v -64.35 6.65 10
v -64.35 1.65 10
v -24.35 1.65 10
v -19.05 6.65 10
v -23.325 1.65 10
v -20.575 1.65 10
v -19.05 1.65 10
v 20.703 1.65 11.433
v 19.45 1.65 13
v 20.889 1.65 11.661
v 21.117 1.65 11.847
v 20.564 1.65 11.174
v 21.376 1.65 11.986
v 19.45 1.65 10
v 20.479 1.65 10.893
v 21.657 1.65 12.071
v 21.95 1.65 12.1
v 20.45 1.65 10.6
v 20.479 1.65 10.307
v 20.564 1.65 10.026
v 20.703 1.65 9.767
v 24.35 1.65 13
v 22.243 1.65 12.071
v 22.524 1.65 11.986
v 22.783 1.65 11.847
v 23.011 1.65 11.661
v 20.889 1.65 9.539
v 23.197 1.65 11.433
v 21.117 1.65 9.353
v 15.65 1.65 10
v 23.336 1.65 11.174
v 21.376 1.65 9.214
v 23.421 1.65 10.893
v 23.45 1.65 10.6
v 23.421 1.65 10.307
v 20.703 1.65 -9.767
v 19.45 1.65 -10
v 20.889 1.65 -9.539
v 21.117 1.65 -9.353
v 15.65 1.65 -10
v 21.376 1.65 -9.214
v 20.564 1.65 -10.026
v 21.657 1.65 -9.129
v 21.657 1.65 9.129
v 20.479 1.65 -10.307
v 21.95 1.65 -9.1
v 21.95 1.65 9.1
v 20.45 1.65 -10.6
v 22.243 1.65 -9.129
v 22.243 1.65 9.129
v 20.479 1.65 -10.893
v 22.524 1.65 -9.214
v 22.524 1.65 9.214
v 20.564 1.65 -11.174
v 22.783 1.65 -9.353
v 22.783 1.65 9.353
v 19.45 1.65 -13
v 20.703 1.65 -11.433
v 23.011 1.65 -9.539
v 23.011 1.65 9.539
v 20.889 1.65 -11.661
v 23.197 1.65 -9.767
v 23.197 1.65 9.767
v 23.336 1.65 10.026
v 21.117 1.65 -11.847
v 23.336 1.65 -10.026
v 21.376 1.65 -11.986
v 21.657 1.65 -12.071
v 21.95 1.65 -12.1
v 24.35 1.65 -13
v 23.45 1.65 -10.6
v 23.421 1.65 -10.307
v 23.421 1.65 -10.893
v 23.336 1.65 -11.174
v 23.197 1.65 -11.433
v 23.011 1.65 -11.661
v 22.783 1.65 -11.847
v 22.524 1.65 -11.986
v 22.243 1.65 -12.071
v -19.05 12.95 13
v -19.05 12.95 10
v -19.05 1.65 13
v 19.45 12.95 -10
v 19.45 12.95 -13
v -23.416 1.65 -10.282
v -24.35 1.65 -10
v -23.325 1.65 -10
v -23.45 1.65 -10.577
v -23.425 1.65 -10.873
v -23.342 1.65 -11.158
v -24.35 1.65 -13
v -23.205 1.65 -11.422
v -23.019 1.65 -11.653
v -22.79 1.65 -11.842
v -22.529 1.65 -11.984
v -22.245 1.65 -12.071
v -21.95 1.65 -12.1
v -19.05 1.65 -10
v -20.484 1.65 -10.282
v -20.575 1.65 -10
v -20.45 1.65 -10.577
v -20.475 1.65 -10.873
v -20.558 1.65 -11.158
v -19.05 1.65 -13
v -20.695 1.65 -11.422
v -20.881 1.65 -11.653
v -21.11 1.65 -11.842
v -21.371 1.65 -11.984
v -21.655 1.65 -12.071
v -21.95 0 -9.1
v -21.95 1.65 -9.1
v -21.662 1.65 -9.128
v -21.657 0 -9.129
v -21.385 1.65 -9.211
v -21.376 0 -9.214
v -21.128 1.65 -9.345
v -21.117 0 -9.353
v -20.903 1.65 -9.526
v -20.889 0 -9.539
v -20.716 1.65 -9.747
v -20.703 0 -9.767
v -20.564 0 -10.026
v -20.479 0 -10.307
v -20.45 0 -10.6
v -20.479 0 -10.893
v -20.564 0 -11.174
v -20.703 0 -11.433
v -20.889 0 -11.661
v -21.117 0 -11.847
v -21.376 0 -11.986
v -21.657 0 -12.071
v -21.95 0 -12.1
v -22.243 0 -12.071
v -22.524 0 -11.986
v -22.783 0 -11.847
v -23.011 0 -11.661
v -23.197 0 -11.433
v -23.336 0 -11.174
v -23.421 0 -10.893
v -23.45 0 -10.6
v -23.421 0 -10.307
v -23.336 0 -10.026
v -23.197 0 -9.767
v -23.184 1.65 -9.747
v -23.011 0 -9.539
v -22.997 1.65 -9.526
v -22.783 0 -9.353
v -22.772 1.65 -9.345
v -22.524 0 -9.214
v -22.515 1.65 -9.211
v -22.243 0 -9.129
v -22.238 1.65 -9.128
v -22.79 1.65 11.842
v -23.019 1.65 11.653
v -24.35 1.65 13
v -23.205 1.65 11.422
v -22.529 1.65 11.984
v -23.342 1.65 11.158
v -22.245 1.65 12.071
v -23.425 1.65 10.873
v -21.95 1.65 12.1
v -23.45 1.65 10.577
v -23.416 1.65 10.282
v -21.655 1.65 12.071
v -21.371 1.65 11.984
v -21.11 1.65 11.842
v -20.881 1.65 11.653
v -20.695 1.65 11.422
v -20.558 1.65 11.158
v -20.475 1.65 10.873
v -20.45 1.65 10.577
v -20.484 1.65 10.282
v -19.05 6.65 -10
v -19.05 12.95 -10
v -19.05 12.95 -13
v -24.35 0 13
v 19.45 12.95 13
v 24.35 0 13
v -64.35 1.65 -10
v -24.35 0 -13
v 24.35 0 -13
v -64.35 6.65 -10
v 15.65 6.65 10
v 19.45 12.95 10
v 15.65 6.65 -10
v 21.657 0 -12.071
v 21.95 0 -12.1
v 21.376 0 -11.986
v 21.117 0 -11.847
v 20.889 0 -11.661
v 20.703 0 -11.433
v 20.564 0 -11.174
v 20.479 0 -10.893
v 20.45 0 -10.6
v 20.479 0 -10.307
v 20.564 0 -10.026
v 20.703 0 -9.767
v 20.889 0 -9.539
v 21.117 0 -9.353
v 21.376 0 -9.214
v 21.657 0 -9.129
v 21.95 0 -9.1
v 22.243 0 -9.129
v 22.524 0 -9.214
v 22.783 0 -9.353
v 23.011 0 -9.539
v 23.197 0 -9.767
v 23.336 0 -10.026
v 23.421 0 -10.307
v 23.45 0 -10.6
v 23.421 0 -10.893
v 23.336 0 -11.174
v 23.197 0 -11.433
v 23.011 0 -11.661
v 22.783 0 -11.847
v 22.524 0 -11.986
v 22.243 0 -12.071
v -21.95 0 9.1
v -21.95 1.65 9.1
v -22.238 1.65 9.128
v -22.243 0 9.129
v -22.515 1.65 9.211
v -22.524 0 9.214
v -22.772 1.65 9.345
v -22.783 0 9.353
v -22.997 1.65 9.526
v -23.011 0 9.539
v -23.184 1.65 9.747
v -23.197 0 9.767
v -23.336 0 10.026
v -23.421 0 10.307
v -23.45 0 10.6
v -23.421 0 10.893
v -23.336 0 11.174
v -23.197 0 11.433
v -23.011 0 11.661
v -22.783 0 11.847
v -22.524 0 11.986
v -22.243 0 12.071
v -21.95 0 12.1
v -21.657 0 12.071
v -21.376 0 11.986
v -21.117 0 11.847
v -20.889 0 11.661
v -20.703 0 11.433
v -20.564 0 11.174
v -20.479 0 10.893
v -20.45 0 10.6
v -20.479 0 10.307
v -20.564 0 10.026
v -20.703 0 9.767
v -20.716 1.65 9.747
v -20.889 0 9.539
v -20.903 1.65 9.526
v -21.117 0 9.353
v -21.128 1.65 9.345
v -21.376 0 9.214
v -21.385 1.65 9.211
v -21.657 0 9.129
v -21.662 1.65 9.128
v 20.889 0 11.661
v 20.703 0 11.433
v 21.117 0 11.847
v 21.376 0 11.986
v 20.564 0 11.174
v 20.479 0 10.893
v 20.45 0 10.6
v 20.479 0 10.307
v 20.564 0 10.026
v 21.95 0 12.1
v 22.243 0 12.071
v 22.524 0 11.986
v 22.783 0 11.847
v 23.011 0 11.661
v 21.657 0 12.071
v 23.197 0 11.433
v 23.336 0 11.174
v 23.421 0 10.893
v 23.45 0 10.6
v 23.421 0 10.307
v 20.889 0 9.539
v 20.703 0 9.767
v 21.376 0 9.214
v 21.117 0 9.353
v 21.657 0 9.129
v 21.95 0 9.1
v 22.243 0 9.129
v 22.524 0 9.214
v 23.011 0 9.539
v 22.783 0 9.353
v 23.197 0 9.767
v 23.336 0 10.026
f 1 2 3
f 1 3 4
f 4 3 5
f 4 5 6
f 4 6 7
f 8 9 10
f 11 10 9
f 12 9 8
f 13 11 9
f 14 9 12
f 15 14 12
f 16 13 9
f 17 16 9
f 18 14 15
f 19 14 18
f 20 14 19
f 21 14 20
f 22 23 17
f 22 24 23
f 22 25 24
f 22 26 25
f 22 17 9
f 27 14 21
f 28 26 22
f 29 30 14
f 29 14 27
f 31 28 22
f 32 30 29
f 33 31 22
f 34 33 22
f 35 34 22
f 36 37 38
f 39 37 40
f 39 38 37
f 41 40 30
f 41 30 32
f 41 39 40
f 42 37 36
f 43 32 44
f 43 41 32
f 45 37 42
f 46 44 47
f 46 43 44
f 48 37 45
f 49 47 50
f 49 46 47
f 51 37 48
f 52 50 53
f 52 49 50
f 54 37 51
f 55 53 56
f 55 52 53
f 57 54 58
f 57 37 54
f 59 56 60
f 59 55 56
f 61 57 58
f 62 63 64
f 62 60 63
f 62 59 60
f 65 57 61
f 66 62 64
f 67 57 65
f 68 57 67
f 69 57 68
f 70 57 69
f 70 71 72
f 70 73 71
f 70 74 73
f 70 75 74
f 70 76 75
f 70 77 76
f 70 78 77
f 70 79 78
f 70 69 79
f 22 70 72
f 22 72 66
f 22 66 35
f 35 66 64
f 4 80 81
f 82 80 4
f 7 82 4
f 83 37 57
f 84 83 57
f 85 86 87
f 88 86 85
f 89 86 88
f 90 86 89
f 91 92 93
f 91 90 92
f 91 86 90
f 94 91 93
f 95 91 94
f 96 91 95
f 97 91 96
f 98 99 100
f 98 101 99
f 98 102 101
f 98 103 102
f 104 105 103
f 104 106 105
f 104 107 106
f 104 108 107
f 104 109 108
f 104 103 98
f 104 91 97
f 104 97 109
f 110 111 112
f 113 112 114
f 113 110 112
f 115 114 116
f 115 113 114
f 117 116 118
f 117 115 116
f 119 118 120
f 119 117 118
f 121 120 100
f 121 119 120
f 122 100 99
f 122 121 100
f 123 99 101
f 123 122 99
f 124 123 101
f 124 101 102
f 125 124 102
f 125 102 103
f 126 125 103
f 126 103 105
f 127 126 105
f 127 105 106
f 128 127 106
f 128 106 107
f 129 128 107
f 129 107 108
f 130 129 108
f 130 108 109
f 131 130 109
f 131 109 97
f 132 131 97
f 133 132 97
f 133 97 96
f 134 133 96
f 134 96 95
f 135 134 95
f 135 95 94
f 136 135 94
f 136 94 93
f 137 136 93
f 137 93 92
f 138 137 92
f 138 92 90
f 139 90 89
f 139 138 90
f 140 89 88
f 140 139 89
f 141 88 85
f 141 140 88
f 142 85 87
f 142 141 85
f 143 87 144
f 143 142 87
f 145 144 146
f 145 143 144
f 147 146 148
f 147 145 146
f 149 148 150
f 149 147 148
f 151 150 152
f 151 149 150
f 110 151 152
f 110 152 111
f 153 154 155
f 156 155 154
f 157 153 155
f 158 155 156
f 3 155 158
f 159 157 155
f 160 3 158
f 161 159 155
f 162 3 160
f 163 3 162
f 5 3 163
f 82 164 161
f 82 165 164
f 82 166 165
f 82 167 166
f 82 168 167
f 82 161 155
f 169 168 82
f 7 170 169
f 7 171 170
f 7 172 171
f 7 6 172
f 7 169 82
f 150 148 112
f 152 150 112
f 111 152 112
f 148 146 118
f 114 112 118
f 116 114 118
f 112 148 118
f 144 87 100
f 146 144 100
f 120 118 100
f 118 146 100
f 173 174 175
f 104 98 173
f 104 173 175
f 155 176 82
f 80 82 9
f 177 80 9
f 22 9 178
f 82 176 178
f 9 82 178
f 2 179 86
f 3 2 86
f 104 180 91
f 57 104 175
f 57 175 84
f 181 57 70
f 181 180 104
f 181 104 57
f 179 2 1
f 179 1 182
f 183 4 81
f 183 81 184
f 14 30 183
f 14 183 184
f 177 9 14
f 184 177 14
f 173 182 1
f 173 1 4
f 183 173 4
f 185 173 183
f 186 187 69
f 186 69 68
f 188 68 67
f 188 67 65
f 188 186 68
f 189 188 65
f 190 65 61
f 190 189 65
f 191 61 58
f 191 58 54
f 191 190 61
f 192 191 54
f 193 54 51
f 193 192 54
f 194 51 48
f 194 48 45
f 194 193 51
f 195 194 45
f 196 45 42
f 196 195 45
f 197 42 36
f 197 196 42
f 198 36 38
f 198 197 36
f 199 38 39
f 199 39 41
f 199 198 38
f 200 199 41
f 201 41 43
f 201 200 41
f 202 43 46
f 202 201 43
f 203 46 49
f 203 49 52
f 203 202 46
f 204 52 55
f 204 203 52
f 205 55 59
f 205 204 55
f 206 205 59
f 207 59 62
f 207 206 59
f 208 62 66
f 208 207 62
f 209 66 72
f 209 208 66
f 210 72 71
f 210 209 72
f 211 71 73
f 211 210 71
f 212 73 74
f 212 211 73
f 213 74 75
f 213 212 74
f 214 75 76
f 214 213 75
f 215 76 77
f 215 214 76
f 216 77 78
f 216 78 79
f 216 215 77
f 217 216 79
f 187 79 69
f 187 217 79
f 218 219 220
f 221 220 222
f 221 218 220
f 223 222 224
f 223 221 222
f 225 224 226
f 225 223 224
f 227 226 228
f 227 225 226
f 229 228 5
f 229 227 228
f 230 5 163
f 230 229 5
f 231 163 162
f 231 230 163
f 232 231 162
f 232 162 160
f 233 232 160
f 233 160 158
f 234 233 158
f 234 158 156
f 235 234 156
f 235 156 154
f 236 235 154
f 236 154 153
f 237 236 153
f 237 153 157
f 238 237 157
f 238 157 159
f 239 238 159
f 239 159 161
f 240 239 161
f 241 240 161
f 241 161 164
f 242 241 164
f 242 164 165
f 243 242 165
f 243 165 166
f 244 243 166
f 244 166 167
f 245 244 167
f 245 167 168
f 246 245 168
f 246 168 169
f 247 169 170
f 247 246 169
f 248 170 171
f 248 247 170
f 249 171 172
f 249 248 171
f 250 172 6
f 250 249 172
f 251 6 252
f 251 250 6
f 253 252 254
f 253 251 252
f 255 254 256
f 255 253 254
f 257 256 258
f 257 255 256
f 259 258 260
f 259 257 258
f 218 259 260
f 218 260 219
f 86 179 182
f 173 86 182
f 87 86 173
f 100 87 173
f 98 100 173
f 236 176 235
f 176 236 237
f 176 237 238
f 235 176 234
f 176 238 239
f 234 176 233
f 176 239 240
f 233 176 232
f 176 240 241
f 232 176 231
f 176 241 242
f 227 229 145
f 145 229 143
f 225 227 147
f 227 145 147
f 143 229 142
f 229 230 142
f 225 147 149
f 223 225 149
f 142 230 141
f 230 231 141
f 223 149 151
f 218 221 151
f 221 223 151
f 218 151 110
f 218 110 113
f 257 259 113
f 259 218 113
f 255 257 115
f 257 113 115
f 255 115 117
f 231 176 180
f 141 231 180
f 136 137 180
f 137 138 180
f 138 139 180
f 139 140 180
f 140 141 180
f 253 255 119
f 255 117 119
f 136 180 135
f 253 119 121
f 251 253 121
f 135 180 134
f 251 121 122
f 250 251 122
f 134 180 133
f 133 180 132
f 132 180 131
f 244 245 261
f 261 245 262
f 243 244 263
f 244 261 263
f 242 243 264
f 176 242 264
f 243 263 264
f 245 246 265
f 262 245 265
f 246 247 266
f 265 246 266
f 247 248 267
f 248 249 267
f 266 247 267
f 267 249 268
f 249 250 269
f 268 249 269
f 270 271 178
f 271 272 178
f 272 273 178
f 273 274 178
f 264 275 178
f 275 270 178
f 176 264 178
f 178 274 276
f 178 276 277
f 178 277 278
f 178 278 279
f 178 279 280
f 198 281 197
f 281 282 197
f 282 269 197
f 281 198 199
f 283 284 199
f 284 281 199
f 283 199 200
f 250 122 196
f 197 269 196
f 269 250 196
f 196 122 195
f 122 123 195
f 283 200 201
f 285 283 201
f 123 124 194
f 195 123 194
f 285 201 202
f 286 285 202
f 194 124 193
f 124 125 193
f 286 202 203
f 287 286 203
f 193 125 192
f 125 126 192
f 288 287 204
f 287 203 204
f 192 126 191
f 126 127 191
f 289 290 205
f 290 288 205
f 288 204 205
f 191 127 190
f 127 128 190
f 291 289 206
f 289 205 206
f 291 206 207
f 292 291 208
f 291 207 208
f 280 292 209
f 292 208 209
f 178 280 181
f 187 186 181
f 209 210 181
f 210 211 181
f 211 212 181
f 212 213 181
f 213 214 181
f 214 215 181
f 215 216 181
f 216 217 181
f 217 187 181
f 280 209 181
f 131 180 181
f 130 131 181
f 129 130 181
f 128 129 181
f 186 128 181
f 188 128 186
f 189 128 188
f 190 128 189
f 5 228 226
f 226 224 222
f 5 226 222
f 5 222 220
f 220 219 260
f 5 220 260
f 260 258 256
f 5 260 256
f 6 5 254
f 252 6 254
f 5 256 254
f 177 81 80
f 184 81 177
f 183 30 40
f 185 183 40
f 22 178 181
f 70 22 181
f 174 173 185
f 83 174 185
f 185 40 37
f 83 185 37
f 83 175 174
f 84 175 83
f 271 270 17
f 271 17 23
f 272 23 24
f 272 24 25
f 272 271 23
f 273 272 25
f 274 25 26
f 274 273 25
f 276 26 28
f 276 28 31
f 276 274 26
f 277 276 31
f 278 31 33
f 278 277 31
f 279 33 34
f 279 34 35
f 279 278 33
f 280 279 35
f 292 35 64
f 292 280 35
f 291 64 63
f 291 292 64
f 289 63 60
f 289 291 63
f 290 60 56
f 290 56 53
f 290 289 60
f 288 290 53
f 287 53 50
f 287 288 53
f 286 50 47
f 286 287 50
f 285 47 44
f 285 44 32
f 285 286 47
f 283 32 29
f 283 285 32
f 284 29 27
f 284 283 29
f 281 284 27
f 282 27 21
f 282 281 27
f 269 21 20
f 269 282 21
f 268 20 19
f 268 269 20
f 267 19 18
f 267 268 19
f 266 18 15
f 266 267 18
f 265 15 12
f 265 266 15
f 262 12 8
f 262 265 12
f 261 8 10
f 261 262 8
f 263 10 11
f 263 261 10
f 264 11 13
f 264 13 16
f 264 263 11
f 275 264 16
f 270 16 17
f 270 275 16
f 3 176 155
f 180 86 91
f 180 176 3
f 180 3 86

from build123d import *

# Parameters (mm, degrees)
SKETCH1_W           = 48.7
SKETCH1_H           = 26
SKETCH1_R           = 1.5
BOSS_EXTRUDE1_DEPTH = 1.65
SKETCH2_W           = 38.5
SKETCH2_H           = 3
BOSS_EXTRUDE2_DEPTH = 11.3
SKETCH3_W           = 80
SKETCH3_H           = 20
BOSS_EXTRUDE3_DEPTH = 5


with BuildPart() as part:
    # Sketch1 → Boss-Extrude1 (new body)
    with BuildSketch(Plane(origin=(0, 0, 0), x_dir=(1, 0, 0), z_dir=(0, 1, 0))):
        Rectangle(SKETCH1_W, SKETCH1_H)
        with Locations(Location((-21.95, 10.6, 0), (0, 0, 270))):
            Circle(SKETCH1_R, mode=Mode.SUBTRACT)
        with Locations(Location((-21.95, -10.6, 0), (0, 0, 90))):
            Circle(SKETCH1_R, mode=Mode.SUBTRACT)
        with Locations(Location((21.95, -10.6, 0), (0, 0, 270))):
            Circle(SKETCH1_R, mode=Mode.SUBTRACT)
        with Locations(Location((21.95, 10.6, 0), (0, 0, 90))):
            Circle(SKETCH1_R, mode=Mode.SUBTRACT)
    extrude(amount=BOSS_EXTRUDE1_DEPTH)

    # Sketch2 → Boss-Extrude2 (add)
    with BuildSketch(Plane(origin=(0, 1.65, 0), x_dir=(1, 0, 0), z_dir=(0, 1, 0))):
        with Locations((0.2, 11.5)):
            Rectangle(SKETCH2_W, SKETCH2_H)
        with Locations((0.2, -11.5)):
            Rectangle(SKETCH2_W, SKETCH2_H)
    extrude(amount=BOSS_EXTRUDE2_DEPTH)

    # Sketch3 → Boss-Extrude3 (add)
    with BuildSketch(Plane(origin=(0, 1.65, 0), x_dir=(1, 0, 0), z_dir=(0, 1, 0))):
        with Locations((-24.35, 0)):
            Rectangle(SKETCH3_W, SKETCH3_H)
    extrude(amount=BOSS_EXTRUDE3_DEPTH)


solid = part.part
